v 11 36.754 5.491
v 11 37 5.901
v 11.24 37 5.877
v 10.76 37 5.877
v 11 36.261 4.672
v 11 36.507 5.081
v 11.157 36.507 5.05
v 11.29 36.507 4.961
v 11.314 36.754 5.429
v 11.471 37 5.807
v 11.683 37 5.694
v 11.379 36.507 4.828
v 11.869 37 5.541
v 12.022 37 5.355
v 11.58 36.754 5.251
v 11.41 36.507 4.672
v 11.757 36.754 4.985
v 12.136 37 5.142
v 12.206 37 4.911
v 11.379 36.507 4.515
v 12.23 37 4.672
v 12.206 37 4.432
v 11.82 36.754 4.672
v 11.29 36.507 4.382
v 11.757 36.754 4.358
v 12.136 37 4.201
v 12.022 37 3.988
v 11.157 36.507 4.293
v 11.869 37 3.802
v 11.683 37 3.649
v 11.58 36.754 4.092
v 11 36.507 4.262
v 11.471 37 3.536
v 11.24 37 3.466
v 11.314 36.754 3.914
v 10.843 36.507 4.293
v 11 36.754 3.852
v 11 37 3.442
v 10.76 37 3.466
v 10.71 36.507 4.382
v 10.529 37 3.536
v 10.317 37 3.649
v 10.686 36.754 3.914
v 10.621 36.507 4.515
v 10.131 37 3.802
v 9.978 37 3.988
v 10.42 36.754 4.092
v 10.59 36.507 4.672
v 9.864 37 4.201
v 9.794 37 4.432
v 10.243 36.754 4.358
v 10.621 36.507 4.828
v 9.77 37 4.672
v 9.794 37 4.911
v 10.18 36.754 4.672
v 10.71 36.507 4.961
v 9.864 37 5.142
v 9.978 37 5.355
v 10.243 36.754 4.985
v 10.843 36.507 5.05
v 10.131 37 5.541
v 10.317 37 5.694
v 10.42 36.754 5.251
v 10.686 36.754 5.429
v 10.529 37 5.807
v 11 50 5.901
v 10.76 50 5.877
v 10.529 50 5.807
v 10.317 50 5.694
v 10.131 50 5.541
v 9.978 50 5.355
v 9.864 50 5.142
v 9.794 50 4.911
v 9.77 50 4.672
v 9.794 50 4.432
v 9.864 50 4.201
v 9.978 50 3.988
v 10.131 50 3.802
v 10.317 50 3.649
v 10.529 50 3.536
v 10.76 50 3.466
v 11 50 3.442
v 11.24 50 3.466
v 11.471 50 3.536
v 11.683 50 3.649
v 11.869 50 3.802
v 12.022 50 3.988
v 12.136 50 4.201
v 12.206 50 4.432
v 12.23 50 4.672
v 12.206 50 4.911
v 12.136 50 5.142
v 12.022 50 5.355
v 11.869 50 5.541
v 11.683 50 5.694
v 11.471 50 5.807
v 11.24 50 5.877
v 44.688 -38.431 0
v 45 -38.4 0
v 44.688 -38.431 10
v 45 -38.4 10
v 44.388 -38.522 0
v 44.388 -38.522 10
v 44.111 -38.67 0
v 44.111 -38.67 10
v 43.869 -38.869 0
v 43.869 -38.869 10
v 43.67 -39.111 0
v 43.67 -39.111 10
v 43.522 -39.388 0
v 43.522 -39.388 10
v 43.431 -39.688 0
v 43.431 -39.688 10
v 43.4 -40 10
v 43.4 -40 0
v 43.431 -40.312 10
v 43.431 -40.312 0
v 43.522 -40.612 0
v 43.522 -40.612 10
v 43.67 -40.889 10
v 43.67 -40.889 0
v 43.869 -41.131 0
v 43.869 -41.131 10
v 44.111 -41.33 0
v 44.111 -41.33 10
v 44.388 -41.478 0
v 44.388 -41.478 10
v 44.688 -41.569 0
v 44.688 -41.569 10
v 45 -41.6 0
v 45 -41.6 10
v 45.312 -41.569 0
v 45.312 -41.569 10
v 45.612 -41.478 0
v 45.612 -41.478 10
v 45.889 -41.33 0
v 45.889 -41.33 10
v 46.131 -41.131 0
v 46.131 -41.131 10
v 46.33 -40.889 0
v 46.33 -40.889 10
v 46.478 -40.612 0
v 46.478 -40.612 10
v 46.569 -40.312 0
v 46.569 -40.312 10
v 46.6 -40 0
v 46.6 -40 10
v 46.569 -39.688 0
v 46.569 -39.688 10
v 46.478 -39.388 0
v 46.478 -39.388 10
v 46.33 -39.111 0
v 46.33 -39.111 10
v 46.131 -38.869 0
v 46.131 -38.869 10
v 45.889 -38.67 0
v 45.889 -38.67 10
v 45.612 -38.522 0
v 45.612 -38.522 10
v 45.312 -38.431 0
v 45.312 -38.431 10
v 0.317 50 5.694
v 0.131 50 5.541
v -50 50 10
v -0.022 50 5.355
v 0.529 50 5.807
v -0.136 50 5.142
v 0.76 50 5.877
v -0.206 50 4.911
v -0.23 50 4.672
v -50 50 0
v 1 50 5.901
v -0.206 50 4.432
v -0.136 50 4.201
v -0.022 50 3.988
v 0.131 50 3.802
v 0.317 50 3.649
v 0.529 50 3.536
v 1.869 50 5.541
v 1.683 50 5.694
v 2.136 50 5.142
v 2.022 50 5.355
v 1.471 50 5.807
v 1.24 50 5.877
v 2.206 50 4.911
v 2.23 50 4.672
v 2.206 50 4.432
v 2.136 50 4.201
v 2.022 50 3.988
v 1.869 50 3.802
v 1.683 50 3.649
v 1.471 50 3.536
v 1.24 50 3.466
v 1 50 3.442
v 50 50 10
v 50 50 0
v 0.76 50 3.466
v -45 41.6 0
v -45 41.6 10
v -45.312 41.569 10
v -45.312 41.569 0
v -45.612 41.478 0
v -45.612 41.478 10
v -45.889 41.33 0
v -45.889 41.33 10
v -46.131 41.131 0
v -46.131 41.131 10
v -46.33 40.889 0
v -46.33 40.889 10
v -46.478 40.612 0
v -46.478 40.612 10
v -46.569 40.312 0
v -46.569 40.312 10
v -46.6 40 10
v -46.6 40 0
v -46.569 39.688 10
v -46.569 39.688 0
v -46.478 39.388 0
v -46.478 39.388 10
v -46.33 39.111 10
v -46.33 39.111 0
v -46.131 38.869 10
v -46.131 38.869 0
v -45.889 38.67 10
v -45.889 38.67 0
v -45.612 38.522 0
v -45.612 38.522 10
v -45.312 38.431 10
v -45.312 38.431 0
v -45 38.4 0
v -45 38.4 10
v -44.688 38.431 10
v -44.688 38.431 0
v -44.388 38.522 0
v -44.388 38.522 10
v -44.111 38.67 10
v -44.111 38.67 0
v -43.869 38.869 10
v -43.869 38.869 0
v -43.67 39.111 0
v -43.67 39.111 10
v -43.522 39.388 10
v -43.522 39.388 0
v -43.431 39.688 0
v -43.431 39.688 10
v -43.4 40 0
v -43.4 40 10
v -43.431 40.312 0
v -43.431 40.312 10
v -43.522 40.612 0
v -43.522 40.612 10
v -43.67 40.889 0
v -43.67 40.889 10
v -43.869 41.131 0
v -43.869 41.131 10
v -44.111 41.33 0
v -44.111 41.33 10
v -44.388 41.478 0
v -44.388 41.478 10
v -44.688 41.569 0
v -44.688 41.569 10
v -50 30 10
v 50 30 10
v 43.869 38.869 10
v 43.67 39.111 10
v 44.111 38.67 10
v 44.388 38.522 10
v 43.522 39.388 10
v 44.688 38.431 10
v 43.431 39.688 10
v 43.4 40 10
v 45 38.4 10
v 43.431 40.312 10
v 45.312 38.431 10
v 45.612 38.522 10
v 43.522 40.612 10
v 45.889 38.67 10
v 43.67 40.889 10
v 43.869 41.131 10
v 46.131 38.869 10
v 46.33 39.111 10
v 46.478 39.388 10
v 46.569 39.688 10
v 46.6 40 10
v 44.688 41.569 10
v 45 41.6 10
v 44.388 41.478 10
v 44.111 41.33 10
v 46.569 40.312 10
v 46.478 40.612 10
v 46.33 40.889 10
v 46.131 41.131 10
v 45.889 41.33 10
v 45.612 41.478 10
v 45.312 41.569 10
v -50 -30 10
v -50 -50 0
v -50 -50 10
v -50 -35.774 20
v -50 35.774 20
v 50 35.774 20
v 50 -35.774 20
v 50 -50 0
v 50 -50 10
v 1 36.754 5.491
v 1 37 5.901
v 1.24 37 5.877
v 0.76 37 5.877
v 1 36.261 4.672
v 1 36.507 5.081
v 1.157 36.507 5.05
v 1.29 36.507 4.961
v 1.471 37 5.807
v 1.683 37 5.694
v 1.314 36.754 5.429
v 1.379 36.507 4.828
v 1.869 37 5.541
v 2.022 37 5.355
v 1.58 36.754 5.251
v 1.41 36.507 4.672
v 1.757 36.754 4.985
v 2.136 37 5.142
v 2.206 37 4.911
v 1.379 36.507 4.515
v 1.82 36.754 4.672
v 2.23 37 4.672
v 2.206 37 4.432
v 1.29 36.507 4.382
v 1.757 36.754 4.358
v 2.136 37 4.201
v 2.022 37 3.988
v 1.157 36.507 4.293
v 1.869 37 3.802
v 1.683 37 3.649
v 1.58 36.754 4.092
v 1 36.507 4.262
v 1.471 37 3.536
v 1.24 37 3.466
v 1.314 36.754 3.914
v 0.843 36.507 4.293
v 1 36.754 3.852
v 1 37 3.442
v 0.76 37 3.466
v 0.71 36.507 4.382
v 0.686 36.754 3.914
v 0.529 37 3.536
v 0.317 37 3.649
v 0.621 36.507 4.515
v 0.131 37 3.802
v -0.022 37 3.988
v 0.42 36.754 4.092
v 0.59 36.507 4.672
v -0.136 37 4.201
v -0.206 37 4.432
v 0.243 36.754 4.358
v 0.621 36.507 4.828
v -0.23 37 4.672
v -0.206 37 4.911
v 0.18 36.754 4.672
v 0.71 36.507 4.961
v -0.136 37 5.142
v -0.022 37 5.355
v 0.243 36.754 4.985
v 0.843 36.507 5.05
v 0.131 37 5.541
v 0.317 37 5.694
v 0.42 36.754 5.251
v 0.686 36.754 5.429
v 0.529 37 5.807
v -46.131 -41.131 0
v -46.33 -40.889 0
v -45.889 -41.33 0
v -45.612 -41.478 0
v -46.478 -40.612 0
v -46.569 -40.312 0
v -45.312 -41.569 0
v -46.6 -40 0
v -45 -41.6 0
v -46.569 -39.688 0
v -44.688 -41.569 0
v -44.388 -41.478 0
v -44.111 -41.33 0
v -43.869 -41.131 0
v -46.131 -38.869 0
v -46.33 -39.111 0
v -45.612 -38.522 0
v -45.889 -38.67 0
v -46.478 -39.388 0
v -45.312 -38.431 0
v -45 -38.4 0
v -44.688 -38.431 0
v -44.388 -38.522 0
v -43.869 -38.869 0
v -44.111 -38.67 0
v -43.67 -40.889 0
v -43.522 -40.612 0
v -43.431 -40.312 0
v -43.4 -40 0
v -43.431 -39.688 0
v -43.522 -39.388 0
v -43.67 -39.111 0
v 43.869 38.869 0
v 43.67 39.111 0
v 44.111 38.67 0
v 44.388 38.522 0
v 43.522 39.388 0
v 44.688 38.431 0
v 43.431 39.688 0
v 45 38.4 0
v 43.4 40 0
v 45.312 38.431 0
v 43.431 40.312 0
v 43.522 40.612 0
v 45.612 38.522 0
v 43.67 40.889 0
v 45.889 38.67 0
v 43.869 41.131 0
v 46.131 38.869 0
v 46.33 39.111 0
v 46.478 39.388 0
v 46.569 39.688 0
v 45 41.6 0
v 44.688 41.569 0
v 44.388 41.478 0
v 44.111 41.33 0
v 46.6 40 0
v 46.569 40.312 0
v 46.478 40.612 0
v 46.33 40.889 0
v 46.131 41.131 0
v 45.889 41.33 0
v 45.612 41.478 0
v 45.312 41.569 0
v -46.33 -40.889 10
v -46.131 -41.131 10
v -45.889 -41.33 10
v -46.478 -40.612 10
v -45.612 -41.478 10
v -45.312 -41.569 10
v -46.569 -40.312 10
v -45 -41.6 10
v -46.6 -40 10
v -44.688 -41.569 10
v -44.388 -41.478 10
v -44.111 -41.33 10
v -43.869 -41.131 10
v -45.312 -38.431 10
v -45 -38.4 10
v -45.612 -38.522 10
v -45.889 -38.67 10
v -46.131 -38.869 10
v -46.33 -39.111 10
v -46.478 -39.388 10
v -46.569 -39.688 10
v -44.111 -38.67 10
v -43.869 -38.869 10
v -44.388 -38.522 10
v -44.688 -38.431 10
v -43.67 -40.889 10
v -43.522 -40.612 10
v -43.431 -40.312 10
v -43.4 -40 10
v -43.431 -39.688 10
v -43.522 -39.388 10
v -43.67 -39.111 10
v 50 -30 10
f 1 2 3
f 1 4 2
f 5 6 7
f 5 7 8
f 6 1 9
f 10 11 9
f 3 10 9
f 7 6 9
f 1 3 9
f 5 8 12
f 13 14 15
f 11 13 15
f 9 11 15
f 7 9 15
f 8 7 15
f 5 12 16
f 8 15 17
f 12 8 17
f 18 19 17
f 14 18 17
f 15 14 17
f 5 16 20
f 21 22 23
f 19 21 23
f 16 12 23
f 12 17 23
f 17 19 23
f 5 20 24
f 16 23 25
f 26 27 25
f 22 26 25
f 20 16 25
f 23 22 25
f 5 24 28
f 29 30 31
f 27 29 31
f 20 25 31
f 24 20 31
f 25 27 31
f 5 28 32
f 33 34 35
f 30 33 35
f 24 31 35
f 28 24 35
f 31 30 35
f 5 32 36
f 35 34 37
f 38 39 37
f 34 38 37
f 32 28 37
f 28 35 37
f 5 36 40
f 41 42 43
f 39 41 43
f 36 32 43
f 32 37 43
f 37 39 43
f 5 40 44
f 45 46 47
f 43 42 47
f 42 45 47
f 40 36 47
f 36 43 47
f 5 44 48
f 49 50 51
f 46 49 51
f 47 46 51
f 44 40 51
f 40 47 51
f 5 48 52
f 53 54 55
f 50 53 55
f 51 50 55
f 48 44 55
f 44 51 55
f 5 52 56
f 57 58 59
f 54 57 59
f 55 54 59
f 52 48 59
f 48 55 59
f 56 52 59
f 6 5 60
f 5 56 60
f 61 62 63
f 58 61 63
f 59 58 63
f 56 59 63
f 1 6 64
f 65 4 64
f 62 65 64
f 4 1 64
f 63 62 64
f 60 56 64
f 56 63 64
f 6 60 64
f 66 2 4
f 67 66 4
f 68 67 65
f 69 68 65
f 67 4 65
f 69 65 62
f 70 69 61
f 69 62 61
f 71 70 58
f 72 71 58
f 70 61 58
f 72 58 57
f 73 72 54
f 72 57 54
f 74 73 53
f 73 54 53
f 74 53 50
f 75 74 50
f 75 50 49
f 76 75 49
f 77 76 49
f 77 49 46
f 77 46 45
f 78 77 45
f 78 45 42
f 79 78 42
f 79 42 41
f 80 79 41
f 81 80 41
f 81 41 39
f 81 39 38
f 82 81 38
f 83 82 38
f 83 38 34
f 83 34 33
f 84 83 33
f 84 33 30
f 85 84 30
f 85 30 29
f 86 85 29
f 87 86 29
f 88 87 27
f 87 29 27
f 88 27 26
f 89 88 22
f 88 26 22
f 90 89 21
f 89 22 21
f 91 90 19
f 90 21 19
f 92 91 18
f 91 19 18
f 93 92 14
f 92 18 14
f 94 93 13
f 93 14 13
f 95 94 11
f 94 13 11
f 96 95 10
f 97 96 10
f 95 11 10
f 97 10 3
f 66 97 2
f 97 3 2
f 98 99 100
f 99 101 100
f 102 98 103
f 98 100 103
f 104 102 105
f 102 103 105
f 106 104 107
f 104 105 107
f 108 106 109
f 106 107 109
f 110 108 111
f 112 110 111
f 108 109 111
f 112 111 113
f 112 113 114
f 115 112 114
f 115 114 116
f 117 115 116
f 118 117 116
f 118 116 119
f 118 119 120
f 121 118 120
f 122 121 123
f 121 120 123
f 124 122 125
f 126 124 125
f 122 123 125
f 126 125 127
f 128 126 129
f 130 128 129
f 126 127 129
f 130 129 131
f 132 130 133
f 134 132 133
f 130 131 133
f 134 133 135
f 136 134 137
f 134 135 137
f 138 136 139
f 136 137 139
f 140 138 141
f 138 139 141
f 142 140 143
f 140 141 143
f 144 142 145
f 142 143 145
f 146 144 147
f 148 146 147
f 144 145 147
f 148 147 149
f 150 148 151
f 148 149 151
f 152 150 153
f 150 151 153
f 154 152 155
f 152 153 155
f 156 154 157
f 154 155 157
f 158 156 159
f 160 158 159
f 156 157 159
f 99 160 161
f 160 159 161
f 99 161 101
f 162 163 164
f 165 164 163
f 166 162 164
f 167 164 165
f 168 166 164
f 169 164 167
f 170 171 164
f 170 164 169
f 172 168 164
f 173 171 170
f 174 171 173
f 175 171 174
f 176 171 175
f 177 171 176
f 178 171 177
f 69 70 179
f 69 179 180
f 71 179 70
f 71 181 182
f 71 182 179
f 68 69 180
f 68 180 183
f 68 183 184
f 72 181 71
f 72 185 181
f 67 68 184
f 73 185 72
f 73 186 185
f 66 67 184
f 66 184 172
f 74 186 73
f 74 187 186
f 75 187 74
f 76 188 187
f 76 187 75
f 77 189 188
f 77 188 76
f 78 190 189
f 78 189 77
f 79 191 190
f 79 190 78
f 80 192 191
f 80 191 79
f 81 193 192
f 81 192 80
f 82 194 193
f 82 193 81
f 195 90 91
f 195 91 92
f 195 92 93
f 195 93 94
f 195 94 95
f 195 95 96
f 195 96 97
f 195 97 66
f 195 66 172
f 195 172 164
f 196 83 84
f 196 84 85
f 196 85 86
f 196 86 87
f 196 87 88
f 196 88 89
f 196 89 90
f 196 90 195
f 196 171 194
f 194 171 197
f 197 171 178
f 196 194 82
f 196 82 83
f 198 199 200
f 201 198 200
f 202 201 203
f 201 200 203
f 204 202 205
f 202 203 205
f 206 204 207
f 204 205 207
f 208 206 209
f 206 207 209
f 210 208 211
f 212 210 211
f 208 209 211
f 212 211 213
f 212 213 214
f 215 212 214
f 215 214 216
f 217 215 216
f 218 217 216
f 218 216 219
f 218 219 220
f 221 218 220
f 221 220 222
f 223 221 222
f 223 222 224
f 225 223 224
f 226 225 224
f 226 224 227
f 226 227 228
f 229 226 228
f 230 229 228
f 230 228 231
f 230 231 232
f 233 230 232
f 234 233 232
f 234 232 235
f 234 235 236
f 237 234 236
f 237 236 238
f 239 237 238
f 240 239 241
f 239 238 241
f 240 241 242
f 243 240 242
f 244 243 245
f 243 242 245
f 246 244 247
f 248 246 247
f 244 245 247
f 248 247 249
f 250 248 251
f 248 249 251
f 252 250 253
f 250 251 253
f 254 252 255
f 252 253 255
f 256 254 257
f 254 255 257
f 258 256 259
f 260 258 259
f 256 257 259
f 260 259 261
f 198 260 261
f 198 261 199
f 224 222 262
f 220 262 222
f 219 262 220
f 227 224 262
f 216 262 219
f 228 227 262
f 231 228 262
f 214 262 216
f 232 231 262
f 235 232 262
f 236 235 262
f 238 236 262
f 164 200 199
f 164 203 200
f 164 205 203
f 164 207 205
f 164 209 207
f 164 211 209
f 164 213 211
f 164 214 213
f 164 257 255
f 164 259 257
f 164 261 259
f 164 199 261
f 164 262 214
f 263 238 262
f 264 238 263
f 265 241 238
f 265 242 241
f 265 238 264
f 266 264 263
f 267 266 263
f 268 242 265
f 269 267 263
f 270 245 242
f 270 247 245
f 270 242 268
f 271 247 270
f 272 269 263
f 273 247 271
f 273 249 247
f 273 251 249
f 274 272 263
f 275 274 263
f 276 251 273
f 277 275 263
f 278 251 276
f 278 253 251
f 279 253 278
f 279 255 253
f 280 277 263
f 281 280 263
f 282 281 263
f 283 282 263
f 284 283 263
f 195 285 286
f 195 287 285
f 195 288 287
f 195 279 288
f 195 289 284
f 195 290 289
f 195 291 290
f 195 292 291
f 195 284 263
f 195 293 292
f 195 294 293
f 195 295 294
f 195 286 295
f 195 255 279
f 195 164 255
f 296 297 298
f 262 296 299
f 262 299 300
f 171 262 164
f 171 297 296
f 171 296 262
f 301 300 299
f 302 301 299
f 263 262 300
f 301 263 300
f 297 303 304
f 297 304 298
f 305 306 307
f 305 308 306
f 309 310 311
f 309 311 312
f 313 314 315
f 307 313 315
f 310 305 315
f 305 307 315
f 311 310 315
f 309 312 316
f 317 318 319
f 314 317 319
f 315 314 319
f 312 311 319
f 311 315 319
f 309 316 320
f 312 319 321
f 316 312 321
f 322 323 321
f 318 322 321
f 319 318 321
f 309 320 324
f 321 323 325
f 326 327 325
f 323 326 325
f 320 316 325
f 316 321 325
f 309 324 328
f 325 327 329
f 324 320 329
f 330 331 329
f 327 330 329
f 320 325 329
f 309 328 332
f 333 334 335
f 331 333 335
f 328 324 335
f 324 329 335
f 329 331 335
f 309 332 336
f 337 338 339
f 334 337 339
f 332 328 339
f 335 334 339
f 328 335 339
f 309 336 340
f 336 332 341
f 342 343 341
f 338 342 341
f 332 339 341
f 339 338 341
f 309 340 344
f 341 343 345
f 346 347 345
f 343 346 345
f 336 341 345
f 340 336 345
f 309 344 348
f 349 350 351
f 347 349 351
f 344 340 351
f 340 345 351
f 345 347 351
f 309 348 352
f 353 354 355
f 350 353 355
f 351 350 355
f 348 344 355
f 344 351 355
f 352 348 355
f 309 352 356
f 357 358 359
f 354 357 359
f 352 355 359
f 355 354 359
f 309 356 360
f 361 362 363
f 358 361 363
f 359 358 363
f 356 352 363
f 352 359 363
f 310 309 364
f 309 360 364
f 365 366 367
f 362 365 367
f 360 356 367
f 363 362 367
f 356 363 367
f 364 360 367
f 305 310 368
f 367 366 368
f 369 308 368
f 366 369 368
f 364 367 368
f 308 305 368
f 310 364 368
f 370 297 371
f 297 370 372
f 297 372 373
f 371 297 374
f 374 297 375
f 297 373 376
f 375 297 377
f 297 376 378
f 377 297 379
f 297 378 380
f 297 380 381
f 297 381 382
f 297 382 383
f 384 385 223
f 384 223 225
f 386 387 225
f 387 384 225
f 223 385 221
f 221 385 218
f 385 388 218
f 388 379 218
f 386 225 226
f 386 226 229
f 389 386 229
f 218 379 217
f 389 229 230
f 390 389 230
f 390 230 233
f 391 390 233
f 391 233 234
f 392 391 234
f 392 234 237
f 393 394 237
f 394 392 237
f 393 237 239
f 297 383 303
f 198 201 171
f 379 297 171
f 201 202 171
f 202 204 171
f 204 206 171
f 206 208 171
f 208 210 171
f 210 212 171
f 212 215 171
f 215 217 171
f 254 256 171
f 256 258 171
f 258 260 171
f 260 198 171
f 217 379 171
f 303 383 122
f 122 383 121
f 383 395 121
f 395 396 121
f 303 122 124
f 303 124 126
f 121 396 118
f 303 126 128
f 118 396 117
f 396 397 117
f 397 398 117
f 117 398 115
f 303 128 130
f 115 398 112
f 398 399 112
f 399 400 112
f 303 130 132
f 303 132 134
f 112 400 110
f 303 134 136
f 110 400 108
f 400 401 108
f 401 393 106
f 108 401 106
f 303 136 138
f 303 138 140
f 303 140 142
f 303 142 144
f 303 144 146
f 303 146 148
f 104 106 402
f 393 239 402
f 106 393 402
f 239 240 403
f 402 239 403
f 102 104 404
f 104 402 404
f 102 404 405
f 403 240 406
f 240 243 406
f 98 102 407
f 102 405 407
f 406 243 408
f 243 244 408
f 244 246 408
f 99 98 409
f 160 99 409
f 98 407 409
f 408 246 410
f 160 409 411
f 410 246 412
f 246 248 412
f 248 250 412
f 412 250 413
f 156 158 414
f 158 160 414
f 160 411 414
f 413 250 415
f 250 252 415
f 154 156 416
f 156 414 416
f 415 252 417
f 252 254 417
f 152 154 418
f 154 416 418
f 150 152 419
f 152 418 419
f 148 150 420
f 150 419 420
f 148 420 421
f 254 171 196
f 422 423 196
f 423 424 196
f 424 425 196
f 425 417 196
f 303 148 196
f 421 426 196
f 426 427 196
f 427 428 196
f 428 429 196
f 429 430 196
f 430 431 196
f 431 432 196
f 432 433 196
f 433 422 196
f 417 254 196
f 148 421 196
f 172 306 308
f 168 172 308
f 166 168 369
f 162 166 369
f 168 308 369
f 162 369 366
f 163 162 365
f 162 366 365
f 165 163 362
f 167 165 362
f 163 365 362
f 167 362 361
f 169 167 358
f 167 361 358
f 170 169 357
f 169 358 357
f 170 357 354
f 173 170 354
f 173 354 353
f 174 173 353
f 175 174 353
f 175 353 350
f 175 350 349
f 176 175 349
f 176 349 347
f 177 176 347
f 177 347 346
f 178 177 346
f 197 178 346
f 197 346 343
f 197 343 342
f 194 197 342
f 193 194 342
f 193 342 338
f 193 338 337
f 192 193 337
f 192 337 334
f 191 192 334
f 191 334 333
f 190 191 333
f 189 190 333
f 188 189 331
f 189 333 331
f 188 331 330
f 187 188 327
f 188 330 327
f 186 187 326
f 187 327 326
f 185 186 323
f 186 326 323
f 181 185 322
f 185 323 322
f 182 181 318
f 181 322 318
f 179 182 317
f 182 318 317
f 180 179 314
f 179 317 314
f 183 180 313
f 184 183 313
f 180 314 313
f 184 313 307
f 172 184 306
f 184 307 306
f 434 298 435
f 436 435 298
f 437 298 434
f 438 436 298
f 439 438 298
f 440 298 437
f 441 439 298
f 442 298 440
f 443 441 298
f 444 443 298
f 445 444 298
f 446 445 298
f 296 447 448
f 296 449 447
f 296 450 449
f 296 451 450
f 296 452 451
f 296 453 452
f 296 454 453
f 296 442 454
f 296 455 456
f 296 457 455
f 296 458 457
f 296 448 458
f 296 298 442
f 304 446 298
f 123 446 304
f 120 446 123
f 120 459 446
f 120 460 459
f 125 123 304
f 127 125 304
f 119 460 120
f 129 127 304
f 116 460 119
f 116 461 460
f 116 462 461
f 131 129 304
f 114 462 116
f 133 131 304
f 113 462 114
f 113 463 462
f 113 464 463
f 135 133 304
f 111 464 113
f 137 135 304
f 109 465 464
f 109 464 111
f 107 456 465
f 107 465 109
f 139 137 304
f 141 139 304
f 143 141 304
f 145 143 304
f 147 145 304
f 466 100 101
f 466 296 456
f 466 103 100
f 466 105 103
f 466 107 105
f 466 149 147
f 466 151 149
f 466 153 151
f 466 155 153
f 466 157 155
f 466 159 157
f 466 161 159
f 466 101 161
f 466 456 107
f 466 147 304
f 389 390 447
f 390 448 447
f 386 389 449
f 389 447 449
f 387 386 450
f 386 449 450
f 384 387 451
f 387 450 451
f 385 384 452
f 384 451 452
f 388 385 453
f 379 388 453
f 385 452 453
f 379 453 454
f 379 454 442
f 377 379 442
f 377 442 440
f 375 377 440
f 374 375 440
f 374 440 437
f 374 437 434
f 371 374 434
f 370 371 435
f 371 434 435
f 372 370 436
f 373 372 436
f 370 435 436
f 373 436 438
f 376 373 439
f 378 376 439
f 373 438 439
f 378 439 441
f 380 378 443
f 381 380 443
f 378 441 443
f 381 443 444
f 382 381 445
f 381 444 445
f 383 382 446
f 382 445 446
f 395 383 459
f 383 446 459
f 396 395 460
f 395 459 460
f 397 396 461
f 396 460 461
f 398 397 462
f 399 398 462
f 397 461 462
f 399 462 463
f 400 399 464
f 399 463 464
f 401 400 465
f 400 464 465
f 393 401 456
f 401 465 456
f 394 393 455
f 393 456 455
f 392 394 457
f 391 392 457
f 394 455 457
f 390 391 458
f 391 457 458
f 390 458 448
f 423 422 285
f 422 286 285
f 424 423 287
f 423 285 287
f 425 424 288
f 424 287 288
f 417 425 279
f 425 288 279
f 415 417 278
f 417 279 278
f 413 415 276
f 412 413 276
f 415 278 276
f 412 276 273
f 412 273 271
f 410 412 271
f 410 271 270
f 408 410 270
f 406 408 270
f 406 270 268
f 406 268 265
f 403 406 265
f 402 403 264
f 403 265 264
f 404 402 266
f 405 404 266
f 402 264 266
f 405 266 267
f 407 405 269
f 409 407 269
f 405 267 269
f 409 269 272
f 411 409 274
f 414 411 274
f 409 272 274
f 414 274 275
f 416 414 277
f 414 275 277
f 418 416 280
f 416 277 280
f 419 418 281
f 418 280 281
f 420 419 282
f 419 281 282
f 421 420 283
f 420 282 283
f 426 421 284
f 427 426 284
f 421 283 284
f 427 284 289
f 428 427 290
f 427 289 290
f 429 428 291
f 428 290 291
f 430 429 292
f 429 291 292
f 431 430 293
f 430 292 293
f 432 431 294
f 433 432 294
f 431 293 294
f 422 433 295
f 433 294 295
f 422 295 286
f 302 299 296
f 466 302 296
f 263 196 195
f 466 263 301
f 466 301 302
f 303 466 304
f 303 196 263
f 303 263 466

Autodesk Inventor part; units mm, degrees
ref_plane "YZ Plane" through (0, 0, 0) normal (1, 0, 0) x (0, 1, 0)
ref_plane "XZ Plane" through (0, 0, 0) normal (0, 1, 0) x (-1, 0, 0)
ref_plane "XY Plane" through (0, 0, 0) normal (0, 0, 1) x (1, 0, 0)
sketch "Sketch1" plane through (0, 0, 0) normal (0, 0, 1) x (1, 0, 0)
  line L0 (-50, 50) -> (50, 50)
  line L1 (50, 50) -> (50, -50)
  line L2 (50, -50) -> (-50, -50)
  line L3 (-50, -50) -> (-50, 50)
  line L4 (0, 0) -> (0, 5.8013) construction
  line L5 (0, 0) -> (4.5076, 0) construction
  dimension "d0" = 100
  dimension "d1" = 100
extrude "Extrusion1" add sketch "Sketch1" along normal blind 10
sketch "Sketch2" plane through (50, -50, 0) normal (1, 0, 0) x (0, 0, -1)
  line L0 (-10, 100) -> (-10, 0) projected
  line L1 (-10, 80) -> (-20, 85.7735)
  line L2 (-20, 85.7735) -> (-20, 14.2265)
  line L3 (-20, 14.2265) -> (-10, 20)
  line L4 (0, 100) -> (-10, 100) projected
  line L5 (0, 0) -> (-10, 0) projected
  point P0 (0, 50)
  dimension "d4" = 60
  dimension "d5" = 60
  dimension "d6" = 10
  dimension "d7" = 20
  dimension "d8" = 20
extrude "Extrusion2" add sketch "Sketch2" against normal up to surface (100 mm away)
sketch "Sketch3" plane through (0, 0, 0) normal (0, 0, -1) x (-1, 0, 0)
  line L0 (50, -50) -> (50, 50) projected
  line L1 (50, 50) -> (-50, 50) projected
  line L2 (-50, -50) -> (50, -50) projected
  line L3 (-50, 50) -> (-50, -50) projected
  point P0 (0, 0)
  point P1 (45, -40)
  point P2 (45, 40)
  point P3 (-45, 40)
  point P4 (-45, -40)
  dimension "d11" = 5
  dimension "d12" = 10
  dimension "d13" = 5
  dimension "d14" = 10
  dimension "d15" = 10
  dimension "d16" = 5
  dimension "d17" = 10
  dimension "d18" = 5
hole "Hole1" at (-45, -40, 0) at (-45, 40, 0) at (45, 40, 0) at (45, -40, 0) direction (0, 0, 1) diameter 3.2 end through all
sketch "Sketch4" plane through (-50, 50, 0) normal (0, 1, 0) x (1, 0, 0)
  circle A0 centre (51, -4.6715) radius 1.6 projected
  circle A1 centre (61, -4.6715) radius 1.6 projected
  point P0 (50, 0)
hole "Hole2" at (1, 50, 4.6715) at (11, 50, 4.6715) direction (0, -1, 0) diameter 2.459 depth 13 tip angle 118 thread size "M3x0.5" class "6H" standard "ISO Metric profile"
properties part number "3d_LM-Welding_Tooling - Moving base" material "Aluminium 6061-T6"
